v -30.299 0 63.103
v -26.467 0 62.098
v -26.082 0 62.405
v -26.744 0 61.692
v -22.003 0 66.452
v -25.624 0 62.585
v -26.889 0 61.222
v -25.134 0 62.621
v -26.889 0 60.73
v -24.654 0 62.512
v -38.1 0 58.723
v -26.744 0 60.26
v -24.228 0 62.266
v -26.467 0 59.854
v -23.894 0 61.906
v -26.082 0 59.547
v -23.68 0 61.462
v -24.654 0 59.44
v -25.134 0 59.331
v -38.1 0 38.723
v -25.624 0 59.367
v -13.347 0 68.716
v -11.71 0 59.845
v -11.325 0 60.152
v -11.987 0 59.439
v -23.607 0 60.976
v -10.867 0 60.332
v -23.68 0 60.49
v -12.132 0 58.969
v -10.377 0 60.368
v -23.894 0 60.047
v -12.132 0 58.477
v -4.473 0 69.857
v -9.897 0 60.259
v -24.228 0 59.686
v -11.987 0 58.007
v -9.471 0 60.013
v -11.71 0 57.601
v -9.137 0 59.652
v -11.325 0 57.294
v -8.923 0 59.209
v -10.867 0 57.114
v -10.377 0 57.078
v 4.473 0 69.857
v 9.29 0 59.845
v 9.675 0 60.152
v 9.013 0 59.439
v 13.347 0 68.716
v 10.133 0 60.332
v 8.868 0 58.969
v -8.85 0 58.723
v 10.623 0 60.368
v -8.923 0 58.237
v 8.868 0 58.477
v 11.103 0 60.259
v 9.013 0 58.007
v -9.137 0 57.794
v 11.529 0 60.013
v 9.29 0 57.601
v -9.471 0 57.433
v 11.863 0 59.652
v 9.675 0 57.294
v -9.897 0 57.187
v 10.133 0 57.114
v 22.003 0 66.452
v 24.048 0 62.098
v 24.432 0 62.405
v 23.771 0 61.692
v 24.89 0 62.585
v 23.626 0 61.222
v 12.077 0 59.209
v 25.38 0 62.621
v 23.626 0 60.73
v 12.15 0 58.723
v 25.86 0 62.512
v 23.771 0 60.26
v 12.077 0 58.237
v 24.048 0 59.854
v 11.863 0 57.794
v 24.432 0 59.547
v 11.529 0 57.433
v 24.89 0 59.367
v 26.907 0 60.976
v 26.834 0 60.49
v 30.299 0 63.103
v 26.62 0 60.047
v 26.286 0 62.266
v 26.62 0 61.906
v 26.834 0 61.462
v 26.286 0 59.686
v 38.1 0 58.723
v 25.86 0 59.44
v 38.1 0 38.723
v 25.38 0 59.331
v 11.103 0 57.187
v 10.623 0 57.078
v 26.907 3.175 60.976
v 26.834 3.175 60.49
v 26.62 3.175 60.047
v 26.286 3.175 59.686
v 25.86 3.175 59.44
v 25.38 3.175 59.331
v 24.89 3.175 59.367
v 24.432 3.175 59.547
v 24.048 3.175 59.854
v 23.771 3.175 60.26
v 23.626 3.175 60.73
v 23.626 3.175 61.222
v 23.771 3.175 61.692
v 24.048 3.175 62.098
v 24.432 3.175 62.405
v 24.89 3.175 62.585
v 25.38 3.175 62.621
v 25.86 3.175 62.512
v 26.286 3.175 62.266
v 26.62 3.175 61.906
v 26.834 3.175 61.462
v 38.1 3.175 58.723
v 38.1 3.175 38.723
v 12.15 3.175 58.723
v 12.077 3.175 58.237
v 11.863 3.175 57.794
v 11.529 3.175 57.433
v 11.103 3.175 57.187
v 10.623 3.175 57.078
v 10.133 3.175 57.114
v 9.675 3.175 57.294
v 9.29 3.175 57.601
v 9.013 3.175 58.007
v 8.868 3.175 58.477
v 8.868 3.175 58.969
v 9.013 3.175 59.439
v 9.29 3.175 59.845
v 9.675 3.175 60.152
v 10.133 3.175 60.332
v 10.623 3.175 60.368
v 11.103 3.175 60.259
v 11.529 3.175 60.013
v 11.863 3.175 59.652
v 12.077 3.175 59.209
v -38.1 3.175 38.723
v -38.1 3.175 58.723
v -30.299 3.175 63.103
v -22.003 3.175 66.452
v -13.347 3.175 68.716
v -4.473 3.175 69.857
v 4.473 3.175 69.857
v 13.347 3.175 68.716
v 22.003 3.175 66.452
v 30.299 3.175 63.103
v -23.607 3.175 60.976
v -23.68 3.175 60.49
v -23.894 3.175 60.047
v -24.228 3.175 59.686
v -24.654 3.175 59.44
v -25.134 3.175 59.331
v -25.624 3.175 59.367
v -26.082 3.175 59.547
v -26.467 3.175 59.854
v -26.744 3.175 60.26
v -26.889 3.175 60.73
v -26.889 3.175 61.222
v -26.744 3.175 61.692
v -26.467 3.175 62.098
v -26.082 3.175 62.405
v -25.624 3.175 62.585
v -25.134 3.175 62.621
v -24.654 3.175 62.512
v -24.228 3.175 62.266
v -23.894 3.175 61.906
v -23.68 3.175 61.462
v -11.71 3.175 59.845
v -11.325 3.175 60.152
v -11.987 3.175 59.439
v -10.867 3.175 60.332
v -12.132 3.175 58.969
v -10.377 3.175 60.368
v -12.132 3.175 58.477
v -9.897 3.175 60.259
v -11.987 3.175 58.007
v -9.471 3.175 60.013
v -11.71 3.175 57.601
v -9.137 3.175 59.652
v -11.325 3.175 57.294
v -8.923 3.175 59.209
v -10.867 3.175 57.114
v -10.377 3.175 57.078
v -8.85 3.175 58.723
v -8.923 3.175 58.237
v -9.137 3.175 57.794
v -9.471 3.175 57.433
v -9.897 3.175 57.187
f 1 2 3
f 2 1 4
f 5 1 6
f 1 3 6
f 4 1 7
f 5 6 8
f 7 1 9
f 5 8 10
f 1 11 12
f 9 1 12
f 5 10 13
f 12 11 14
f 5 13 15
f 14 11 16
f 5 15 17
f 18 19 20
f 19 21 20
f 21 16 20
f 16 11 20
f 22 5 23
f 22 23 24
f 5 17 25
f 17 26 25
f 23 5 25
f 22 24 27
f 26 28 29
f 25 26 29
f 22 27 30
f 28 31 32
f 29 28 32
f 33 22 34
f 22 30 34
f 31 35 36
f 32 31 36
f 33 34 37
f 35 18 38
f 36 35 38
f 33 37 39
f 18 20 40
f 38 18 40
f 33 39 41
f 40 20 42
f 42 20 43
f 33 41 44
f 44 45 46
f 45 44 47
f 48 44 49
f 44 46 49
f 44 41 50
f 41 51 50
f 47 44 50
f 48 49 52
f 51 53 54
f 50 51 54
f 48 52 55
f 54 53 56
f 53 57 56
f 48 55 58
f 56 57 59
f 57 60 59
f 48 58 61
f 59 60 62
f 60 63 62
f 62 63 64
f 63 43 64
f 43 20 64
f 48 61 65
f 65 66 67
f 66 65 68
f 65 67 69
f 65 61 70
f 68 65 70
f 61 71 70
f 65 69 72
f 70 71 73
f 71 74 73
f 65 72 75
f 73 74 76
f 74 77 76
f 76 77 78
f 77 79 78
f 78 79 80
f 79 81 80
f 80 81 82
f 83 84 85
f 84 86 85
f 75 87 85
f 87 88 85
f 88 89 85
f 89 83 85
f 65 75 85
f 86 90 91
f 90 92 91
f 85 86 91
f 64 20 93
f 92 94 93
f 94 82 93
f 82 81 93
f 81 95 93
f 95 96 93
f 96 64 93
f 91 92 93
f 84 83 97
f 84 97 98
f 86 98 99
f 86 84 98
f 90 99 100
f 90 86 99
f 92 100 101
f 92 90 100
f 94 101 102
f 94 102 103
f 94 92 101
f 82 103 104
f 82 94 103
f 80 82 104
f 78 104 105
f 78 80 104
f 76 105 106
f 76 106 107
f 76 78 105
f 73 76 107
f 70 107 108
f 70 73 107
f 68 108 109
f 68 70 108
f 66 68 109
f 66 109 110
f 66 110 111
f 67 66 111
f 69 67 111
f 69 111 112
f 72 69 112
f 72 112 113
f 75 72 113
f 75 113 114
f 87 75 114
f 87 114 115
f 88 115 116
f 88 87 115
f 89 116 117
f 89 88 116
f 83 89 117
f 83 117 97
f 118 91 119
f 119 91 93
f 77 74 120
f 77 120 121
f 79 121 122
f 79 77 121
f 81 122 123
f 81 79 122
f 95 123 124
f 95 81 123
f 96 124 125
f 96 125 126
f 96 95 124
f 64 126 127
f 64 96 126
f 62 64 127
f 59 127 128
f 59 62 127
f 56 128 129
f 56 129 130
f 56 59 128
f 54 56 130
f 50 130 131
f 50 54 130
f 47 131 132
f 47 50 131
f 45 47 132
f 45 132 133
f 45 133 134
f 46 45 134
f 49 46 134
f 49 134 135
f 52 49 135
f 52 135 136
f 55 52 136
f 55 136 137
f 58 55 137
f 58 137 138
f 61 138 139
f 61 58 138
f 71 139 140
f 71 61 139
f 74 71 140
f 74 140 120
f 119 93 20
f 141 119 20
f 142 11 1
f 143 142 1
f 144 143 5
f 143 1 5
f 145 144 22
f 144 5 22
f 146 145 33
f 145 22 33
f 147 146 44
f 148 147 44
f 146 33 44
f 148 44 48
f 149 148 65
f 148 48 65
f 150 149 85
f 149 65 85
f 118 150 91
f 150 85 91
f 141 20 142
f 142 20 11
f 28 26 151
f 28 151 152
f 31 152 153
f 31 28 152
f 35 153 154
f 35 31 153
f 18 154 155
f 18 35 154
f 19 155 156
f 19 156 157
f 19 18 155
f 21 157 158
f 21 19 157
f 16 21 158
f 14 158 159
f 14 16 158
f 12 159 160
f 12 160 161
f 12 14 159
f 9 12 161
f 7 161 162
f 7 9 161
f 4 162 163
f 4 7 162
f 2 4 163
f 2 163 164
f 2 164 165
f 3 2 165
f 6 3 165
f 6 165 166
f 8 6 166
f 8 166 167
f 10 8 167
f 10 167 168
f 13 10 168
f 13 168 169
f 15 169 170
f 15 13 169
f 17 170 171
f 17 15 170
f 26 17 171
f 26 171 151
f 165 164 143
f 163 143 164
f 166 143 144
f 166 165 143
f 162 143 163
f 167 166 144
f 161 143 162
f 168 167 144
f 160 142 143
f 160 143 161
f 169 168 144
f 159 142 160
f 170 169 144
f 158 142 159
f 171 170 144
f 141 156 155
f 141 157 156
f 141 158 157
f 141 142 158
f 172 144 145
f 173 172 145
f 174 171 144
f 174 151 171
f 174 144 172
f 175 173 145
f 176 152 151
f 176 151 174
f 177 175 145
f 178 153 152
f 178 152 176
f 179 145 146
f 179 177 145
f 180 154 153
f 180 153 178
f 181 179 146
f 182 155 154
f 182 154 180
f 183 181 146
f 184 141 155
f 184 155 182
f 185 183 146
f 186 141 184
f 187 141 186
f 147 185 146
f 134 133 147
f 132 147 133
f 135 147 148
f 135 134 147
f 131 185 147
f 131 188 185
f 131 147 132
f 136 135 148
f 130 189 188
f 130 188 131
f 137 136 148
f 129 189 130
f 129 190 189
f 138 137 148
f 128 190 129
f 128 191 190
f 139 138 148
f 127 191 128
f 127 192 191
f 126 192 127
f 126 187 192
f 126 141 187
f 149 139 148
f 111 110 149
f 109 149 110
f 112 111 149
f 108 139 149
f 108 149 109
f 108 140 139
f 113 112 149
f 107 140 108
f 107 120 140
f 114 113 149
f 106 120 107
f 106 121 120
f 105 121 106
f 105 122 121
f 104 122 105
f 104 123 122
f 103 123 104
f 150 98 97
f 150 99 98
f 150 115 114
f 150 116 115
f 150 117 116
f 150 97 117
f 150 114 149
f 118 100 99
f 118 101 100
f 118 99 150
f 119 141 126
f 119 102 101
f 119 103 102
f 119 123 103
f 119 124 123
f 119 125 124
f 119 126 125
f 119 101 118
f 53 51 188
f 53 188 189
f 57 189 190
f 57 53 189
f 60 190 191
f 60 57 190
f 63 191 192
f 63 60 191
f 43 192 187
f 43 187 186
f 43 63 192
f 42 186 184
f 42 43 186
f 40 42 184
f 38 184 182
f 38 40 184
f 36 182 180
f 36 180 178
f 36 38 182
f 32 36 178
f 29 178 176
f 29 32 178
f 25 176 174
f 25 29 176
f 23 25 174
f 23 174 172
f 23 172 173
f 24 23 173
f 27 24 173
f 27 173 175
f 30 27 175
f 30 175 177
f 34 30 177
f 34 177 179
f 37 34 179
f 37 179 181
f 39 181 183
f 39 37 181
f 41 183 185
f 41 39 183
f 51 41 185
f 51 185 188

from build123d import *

# Parameters (mm, degrees)
SKETCH2_R           = 1.65
BOSS_EXTRUDE2_DEPTH = 3.175


with BuildPart() as part:
    # Sketch2 → Boss-Extrude2 (new body)
    with BuildSketch(Plane(origin=(0, 0, 0), x_dir=(1, 0, 0), z_dir=(0, 1, 0))):
        with BuildLine():
            Line((-38.1, -38.722993793), (-38.1, -58.722993793))
            ThreePointArc((-38.1, -58.722993793), (0, -70), (38.1, -58.722993793))
            Line((38.1, -58.722993793), (38.1, -38.722993793))
            Line((38.1, -38.722993793), (-38.1, -38.722993793))
        make_face()
        with Locations((-25.257106536, -60.976049146)):
            Circle(SKETCH2_R, mode=Mode.SUBTRACT)
        with Locations((25.257106536, -60.976049146)):
            Circle(SKETCH2_R, mode=Mode.SUBTRACT)
        with Locations((10.5, -58.722993793)):
            Circle(SKETCH2_R, mode=Mode.SUBTRACT)
        with Locations((-10.5, -58.722993793)):
            Circle(SKETCH2_R, mode=Mode.SUBTRACT)
    extrude(amount=BOSS_EXTRUDE2_DEPTH)


solid = part.part
